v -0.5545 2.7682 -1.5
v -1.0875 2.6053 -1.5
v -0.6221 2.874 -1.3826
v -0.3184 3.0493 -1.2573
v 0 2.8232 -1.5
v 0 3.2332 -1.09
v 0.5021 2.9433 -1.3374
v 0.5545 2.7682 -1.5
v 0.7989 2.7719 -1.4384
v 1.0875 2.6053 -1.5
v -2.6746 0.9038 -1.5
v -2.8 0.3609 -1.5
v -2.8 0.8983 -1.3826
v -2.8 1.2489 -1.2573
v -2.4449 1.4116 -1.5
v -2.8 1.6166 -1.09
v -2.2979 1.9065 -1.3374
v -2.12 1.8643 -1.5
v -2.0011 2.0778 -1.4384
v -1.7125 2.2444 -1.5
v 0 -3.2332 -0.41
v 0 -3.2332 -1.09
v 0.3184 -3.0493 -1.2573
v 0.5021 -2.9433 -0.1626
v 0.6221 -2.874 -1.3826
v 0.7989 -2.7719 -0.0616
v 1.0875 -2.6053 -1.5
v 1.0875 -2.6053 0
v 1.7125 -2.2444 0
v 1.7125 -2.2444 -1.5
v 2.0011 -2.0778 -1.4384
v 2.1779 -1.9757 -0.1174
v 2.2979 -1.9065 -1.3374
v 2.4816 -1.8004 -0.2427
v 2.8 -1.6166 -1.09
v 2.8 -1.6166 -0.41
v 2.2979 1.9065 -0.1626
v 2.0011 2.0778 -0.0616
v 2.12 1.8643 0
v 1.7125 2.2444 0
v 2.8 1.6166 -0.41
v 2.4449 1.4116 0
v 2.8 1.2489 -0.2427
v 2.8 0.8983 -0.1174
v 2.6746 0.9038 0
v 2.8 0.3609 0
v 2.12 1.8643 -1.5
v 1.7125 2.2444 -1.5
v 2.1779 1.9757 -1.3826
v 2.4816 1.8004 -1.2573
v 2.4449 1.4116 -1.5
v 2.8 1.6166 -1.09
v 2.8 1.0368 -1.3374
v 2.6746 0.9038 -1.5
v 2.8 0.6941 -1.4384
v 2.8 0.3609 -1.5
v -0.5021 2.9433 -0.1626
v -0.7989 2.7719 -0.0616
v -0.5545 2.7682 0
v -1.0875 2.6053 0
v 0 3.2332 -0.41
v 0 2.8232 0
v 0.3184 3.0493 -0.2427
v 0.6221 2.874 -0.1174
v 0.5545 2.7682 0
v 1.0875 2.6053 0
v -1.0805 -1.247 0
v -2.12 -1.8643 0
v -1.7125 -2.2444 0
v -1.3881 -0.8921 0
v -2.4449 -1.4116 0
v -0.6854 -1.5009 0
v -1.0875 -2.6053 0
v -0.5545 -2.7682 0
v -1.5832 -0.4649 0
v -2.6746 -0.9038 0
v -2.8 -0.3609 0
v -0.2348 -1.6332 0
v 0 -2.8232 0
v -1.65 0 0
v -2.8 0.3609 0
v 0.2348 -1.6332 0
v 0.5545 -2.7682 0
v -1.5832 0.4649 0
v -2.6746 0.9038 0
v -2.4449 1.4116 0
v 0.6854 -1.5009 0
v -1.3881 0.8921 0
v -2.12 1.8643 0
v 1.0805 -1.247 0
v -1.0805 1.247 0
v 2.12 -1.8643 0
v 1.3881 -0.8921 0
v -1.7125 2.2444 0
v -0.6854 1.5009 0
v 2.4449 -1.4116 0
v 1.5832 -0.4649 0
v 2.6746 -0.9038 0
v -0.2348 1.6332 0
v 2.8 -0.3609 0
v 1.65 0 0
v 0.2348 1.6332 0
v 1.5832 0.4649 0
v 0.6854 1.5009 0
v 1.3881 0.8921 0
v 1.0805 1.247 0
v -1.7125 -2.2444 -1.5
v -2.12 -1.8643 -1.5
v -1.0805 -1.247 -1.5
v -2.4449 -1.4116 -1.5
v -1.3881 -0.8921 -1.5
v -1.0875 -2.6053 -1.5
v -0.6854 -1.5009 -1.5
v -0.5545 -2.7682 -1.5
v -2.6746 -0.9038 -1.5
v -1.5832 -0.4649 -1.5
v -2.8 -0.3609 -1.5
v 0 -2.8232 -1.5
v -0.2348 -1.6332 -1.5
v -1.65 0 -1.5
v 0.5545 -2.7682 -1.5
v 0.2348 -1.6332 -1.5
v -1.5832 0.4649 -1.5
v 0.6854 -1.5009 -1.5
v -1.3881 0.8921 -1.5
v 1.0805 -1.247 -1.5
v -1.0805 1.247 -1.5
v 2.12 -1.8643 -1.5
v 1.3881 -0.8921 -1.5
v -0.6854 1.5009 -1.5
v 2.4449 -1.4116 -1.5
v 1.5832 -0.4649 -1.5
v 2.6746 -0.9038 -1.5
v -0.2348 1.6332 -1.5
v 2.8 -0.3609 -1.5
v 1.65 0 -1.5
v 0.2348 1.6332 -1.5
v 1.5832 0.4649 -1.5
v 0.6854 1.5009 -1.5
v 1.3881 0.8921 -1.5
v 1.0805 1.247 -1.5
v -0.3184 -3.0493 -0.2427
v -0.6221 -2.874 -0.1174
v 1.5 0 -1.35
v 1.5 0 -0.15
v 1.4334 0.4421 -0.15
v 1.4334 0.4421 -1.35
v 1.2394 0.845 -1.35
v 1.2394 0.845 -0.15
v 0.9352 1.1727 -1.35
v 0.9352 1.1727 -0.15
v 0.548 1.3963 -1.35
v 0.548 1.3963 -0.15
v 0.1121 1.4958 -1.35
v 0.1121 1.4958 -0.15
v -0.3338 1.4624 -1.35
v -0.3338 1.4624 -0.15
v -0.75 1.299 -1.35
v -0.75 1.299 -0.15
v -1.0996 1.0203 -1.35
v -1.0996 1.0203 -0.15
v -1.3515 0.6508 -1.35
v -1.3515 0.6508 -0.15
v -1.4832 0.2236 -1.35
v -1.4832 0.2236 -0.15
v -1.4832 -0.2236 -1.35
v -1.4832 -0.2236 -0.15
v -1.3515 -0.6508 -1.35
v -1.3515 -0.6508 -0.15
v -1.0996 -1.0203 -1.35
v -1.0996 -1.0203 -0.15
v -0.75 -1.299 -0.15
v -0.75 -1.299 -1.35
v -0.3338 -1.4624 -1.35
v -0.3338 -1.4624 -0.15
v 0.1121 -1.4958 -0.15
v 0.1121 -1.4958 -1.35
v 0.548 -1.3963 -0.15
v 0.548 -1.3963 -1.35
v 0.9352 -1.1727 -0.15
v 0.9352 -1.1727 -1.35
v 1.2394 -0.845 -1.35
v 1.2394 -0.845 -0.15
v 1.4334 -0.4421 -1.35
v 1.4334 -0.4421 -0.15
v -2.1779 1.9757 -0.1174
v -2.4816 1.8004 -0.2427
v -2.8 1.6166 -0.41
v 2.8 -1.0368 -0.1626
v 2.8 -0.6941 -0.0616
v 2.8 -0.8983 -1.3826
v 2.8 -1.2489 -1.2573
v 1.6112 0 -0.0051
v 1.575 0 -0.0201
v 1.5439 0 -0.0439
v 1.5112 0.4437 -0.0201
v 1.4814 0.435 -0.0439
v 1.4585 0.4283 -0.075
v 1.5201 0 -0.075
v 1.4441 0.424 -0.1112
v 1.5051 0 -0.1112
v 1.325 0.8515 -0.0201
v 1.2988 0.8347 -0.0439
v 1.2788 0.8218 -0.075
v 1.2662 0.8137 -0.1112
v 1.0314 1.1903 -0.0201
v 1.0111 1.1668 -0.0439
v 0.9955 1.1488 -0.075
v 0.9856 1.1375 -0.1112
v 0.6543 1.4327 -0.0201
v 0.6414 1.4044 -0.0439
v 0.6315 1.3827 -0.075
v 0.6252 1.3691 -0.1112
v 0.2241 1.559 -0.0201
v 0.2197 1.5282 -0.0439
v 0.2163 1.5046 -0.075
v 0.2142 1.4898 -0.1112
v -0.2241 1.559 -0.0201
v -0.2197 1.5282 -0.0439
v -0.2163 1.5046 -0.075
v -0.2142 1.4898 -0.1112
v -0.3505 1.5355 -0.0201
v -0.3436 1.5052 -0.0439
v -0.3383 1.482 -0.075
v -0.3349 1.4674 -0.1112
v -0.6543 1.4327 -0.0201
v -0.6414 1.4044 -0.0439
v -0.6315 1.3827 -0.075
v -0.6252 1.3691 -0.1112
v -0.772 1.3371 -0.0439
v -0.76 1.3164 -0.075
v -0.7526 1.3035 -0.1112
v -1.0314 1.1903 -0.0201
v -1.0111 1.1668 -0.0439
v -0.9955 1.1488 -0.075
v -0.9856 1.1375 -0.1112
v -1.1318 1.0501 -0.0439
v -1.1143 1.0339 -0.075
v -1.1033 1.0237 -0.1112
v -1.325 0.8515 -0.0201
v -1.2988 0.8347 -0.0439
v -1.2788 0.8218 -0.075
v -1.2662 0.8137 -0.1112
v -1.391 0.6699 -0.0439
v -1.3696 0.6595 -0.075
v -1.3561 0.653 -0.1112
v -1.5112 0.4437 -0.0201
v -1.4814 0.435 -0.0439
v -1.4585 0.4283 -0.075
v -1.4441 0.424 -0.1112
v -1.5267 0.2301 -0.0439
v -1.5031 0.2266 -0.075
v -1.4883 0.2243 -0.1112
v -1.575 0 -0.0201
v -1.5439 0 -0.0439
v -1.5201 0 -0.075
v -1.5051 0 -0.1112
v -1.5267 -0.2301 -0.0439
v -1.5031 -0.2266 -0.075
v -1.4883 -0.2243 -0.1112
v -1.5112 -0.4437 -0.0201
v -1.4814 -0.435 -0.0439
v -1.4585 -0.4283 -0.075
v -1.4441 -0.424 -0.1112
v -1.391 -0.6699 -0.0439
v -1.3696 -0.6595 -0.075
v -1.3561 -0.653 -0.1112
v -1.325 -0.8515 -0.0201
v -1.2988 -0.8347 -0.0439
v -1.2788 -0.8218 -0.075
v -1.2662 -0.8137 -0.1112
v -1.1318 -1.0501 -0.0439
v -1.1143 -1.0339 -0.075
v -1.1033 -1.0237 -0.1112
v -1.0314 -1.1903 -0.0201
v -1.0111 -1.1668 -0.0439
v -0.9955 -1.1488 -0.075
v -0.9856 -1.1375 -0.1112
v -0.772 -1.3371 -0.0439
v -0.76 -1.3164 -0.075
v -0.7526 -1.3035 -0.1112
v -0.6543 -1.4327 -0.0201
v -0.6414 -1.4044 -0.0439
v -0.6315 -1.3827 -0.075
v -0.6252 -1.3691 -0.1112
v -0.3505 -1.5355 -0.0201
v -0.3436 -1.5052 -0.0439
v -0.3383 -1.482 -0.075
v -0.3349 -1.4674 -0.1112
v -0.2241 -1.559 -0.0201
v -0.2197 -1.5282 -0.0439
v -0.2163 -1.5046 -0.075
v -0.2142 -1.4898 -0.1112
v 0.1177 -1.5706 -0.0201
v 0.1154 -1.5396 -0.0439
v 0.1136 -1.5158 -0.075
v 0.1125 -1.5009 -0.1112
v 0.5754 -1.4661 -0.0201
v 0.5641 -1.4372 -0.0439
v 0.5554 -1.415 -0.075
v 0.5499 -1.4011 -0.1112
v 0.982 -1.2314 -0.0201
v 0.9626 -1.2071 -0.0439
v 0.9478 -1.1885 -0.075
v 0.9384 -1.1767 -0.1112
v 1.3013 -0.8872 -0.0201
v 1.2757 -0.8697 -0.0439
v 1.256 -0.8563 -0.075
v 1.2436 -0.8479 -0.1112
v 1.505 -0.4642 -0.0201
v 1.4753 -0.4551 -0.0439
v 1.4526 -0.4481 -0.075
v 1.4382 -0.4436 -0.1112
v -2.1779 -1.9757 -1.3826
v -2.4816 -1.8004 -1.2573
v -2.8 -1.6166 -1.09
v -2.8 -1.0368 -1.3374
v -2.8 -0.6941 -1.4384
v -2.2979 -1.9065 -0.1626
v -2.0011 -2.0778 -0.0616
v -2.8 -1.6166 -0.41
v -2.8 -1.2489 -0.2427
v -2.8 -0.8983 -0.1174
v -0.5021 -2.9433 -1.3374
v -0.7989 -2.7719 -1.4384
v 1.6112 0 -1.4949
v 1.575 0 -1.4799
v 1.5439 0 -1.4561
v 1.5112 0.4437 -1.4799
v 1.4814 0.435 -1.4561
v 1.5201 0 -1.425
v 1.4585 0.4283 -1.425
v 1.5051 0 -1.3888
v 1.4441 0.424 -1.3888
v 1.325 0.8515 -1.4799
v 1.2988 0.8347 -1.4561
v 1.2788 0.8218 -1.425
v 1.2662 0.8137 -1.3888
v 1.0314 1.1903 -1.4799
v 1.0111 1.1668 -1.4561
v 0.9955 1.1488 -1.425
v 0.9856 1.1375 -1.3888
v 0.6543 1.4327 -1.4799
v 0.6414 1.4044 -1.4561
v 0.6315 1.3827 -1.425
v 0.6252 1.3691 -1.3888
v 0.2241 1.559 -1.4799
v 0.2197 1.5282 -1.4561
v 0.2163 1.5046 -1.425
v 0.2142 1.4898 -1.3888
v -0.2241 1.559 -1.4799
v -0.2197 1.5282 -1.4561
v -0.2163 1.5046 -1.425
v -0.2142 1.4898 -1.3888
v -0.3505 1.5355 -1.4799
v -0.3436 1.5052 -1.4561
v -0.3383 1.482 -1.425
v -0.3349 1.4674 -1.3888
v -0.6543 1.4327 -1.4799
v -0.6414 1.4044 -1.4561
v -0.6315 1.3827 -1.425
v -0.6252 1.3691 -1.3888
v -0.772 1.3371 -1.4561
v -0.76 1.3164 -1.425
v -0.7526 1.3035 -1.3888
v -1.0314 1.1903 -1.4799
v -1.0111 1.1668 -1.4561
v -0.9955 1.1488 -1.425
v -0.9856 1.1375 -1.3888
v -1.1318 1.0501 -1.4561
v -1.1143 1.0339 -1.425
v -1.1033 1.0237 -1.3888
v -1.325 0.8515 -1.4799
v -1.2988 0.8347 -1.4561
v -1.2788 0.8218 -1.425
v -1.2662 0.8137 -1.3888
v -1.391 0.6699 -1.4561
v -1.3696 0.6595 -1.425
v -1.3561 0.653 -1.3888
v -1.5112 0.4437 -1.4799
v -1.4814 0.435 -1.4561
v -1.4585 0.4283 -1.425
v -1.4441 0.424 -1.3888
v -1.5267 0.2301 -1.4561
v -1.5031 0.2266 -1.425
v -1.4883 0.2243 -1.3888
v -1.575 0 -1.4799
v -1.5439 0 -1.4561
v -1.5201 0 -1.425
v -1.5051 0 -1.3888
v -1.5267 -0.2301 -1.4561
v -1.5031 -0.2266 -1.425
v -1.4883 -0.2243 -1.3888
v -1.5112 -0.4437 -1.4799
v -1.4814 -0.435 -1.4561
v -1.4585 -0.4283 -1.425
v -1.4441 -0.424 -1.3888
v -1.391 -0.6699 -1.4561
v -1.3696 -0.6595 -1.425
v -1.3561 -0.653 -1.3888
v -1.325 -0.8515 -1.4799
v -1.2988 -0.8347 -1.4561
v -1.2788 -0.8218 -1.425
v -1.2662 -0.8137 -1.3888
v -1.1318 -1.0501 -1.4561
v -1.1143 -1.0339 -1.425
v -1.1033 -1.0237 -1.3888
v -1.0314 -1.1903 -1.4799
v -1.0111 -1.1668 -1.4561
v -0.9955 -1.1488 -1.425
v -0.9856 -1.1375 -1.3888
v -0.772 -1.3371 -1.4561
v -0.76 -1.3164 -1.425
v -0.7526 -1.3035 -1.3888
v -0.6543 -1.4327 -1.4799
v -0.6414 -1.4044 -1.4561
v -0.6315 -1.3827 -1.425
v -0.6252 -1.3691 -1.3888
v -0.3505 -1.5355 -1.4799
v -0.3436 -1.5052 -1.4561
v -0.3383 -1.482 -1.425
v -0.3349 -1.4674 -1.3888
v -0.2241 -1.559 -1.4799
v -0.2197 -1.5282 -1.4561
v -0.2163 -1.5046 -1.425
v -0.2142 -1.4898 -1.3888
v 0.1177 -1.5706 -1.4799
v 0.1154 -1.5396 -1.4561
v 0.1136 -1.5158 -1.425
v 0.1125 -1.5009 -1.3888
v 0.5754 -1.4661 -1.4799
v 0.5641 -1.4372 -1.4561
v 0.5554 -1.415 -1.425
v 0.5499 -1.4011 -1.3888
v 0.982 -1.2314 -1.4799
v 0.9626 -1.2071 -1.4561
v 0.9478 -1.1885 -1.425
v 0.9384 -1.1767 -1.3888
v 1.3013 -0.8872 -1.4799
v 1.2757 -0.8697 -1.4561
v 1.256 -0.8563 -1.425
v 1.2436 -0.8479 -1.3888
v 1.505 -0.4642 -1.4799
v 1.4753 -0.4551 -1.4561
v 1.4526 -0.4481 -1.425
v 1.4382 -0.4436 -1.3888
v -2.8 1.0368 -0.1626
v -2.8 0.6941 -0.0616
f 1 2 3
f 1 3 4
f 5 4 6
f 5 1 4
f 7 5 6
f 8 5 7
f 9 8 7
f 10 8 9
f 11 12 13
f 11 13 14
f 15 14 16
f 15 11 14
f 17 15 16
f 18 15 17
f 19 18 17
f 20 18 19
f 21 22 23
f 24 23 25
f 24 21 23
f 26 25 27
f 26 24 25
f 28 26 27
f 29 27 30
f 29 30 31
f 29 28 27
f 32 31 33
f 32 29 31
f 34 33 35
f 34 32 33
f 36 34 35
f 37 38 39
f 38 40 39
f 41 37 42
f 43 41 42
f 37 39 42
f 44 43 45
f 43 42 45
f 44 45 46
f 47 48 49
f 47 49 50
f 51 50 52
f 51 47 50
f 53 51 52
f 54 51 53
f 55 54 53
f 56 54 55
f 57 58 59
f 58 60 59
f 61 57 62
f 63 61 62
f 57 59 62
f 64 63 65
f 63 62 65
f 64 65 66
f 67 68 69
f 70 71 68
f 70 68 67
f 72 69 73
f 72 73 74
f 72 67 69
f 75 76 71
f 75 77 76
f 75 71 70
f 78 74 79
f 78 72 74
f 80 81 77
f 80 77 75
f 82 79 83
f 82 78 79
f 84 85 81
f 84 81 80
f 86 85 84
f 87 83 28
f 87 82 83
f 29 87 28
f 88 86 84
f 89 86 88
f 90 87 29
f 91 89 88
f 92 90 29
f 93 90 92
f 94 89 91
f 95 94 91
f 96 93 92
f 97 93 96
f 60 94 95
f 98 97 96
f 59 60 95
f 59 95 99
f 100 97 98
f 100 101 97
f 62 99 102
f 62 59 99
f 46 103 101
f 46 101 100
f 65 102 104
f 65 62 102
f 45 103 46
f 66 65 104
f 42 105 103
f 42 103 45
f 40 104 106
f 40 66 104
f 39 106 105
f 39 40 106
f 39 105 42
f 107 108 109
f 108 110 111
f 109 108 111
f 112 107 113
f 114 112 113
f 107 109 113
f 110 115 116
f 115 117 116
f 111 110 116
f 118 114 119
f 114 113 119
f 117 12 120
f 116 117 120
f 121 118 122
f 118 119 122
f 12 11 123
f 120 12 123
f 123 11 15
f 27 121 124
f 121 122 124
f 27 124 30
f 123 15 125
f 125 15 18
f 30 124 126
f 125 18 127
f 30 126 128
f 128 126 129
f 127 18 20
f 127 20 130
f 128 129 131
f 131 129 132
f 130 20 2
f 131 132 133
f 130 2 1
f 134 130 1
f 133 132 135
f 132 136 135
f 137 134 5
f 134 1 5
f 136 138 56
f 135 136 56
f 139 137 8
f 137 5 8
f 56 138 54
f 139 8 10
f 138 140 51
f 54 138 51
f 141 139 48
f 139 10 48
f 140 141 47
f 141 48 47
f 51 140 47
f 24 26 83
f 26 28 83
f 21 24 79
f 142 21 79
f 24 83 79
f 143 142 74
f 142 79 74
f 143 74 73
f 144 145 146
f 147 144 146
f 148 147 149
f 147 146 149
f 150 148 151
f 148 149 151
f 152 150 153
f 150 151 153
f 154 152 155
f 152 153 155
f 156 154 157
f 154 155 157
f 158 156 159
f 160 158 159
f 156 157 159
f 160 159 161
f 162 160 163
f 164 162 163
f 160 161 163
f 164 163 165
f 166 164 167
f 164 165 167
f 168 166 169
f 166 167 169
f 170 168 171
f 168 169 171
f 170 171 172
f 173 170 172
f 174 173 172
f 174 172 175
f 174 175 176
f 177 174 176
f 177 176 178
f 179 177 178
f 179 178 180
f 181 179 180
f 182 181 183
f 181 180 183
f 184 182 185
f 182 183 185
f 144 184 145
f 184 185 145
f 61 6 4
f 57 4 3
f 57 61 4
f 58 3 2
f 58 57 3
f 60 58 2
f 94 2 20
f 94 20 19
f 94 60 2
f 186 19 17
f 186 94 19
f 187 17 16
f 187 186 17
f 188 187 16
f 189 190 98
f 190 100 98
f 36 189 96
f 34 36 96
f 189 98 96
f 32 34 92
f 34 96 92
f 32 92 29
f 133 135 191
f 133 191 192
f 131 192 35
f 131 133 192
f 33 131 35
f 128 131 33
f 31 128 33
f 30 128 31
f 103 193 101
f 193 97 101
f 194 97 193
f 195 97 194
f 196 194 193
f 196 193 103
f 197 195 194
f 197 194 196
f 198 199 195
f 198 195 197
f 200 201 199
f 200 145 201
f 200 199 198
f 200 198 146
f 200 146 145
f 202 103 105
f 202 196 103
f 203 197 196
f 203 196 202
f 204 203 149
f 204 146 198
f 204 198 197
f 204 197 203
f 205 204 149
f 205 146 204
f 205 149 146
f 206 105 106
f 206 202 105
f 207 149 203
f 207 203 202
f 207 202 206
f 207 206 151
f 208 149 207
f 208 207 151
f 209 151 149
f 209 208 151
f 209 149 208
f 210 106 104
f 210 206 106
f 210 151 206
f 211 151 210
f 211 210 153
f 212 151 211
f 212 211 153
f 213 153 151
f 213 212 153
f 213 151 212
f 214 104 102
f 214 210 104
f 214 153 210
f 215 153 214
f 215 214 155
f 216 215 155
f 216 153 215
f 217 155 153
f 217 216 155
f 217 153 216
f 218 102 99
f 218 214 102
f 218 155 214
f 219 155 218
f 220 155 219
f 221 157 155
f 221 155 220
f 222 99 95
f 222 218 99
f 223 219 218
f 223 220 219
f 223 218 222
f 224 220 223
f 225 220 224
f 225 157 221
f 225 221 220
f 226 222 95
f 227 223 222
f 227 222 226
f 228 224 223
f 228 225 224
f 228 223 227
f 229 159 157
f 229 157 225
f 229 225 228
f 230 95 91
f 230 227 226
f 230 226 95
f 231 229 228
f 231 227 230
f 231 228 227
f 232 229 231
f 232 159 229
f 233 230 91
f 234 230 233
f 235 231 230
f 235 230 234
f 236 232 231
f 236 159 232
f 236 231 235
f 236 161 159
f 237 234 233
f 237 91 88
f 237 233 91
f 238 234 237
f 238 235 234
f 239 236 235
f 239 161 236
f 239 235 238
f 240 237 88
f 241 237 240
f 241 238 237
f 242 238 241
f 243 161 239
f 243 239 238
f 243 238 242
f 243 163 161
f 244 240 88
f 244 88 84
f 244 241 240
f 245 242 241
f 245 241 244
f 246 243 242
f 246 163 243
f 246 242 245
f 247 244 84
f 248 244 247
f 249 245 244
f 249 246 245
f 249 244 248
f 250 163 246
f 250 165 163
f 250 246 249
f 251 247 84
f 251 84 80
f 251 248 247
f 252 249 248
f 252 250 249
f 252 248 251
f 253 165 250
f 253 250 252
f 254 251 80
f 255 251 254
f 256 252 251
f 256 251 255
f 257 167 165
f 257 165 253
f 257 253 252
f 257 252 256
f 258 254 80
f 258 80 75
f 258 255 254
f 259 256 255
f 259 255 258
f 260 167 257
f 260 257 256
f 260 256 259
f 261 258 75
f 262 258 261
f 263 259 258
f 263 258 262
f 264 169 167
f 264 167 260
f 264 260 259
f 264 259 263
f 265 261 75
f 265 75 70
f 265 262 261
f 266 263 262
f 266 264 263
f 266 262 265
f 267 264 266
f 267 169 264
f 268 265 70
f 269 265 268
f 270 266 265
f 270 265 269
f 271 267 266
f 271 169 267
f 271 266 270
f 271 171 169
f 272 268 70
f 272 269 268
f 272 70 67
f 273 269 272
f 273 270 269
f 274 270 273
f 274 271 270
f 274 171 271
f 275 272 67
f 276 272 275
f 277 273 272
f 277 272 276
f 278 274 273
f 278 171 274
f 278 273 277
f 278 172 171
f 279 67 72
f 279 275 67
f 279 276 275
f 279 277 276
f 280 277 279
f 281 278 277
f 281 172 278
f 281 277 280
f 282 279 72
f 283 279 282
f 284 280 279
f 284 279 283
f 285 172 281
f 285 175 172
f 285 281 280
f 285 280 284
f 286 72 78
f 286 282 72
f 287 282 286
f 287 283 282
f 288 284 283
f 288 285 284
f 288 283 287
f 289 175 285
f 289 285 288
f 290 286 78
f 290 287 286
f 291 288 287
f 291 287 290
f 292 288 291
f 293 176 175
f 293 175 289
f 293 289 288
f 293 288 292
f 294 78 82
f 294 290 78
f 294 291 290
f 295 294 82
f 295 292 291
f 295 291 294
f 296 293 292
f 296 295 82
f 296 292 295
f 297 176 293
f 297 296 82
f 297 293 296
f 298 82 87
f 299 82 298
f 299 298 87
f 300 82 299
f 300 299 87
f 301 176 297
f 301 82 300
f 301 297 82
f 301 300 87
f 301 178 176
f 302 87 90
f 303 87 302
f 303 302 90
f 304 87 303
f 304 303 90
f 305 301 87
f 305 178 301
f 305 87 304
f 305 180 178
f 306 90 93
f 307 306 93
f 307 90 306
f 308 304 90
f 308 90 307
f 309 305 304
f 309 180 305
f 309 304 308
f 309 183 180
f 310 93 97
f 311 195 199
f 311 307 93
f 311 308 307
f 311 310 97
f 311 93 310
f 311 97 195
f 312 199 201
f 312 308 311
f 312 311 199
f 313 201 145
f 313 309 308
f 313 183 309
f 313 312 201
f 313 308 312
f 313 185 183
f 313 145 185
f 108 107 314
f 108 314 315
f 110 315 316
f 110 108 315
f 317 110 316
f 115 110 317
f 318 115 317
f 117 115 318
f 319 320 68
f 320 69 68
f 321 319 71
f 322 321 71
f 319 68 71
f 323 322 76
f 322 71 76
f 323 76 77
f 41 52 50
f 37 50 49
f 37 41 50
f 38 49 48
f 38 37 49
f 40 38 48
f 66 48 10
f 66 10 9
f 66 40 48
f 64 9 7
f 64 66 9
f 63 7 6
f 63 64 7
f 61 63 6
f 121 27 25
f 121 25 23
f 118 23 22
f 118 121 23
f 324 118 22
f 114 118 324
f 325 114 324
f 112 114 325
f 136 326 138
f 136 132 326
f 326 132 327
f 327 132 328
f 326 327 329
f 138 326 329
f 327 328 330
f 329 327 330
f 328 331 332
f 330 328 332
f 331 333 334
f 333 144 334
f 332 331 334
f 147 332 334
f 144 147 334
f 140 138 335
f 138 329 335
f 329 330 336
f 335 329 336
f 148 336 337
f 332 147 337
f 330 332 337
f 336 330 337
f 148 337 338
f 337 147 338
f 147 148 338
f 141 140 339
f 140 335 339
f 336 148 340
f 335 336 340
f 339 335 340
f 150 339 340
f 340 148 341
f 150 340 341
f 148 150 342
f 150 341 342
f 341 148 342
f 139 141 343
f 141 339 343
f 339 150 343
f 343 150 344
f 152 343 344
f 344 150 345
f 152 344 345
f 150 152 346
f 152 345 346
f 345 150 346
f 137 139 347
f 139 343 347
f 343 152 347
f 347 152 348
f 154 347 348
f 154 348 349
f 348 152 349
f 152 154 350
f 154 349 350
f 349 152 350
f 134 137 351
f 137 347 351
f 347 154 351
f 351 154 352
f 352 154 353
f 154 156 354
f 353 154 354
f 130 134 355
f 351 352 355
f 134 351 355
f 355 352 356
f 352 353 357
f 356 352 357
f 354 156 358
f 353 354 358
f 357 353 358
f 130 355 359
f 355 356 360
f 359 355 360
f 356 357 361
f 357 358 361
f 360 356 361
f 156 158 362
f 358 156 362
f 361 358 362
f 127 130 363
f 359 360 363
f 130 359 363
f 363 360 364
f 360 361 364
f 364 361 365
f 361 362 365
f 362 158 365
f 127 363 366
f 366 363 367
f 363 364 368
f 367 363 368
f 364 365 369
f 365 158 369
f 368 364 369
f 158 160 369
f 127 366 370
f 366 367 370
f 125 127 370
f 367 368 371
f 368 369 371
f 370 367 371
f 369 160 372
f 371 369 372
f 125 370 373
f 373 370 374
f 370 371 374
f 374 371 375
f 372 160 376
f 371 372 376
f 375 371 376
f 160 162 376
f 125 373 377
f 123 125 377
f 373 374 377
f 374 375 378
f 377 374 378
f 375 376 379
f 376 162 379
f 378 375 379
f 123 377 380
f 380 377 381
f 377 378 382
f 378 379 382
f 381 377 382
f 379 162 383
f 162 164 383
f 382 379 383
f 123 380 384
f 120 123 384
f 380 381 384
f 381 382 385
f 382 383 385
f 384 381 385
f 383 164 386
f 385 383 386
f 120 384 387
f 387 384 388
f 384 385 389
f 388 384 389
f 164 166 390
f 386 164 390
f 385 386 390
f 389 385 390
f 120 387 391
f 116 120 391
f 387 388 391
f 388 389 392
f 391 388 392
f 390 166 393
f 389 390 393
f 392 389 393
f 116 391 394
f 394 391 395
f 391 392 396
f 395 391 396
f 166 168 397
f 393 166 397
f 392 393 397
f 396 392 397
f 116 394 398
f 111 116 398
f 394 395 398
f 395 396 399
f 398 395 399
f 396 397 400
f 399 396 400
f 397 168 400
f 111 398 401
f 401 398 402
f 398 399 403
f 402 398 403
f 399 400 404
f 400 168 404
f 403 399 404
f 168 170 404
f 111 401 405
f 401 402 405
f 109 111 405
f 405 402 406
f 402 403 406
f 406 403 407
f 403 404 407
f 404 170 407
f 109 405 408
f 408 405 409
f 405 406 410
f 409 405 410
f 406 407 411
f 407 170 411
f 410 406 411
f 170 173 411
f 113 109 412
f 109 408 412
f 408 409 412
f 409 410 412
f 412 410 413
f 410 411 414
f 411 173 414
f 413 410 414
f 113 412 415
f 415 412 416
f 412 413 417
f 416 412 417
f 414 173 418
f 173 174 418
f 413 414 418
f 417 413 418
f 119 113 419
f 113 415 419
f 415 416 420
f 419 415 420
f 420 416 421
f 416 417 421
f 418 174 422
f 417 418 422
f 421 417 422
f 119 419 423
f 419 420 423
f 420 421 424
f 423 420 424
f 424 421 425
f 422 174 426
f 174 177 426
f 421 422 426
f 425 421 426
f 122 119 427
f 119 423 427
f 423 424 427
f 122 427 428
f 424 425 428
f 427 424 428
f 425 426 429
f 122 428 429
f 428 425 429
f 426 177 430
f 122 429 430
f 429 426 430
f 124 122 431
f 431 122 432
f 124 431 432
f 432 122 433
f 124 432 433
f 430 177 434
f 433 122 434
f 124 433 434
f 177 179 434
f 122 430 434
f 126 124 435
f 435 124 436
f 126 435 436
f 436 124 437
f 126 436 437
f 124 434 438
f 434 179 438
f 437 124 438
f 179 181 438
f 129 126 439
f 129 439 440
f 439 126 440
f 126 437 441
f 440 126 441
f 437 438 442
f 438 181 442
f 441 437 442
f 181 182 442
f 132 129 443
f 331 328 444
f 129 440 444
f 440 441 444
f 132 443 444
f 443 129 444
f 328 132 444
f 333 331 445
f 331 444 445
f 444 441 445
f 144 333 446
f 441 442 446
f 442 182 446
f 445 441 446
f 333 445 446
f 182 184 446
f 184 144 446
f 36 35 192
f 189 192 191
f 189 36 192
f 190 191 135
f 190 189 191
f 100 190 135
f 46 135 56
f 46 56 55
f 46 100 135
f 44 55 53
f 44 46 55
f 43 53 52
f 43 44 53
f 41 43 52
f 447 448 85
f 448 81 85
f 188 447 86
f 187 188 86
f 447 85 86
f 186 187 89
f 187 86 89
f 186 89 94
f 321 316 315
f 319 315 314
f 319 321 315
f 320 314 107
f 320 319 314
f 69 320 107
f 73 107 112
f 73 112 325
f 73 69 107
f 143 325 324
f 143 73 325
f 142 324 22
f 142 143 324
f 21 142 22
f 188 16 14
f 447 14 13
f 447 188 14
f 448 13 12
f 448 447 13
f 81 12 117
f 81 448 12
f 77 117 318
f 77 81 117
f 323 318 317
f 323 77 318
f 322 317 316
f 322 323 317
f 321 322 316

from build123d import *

# Parameters (mm, degrees)
EXTRUDE_2_DEPTH     = 1.5
SKETCH_2_R          = 1.5
CUT_EXTRUDE_1_DEPTH = 1.5
FILLET_3_R          = 0.15


with BuildPart() as part:
    # 草图1 → 凸台-拉伸2 (new body)
    with BuildSketch(Plane.XY):
        Polygon((0, 3.233161507), (-2.8, 1.616580754), (-2.8, -1.616580754), (0, -3.233161507), (2.8, -1.616580754), (2.8, 1.616580754), align=None)
    extrude(amount=-EXTRUDE_2_DEPTH)

    # 草图2 → 切除-拉伸1 (cut)
    with BuildSketch(Plane.XY):
        Circle(SKETCH_2_R)
    extrude(amount=-CUT_EXTRUDE_1_DEPTH, mode=Mode.SUBTRACT)

    # 圆角3
    fillet_3_edges = [part.edges().sort_by_distance(p)[0] for p in [
        (-1.5, 0, -1.5),
        (-1.5, 0, 0),
    ]]
    fillet(fillet_3_edges, radius=FILLET_3_R)

    # 草图3 → 切除-旋转1 (revolve, cut)
    with BuildSketch(Plane(origin=(0, 0, 0), x_dir=(0, 0, -1), z_dir=(1, 0, 0))):
        Polygon((0, 3.233161507), (0.41, 3.233161507), (0, 2.823161507), align=None)
        Polygon((1.5, 3.233161507), (1.09, 3.233161507), (1.5, 2.823161507), align=None)
    revolve(axis=Axis((0, 0, 0), (0, 0, -1)), mode=Mode.SUBTRACT)


solid = part.part
